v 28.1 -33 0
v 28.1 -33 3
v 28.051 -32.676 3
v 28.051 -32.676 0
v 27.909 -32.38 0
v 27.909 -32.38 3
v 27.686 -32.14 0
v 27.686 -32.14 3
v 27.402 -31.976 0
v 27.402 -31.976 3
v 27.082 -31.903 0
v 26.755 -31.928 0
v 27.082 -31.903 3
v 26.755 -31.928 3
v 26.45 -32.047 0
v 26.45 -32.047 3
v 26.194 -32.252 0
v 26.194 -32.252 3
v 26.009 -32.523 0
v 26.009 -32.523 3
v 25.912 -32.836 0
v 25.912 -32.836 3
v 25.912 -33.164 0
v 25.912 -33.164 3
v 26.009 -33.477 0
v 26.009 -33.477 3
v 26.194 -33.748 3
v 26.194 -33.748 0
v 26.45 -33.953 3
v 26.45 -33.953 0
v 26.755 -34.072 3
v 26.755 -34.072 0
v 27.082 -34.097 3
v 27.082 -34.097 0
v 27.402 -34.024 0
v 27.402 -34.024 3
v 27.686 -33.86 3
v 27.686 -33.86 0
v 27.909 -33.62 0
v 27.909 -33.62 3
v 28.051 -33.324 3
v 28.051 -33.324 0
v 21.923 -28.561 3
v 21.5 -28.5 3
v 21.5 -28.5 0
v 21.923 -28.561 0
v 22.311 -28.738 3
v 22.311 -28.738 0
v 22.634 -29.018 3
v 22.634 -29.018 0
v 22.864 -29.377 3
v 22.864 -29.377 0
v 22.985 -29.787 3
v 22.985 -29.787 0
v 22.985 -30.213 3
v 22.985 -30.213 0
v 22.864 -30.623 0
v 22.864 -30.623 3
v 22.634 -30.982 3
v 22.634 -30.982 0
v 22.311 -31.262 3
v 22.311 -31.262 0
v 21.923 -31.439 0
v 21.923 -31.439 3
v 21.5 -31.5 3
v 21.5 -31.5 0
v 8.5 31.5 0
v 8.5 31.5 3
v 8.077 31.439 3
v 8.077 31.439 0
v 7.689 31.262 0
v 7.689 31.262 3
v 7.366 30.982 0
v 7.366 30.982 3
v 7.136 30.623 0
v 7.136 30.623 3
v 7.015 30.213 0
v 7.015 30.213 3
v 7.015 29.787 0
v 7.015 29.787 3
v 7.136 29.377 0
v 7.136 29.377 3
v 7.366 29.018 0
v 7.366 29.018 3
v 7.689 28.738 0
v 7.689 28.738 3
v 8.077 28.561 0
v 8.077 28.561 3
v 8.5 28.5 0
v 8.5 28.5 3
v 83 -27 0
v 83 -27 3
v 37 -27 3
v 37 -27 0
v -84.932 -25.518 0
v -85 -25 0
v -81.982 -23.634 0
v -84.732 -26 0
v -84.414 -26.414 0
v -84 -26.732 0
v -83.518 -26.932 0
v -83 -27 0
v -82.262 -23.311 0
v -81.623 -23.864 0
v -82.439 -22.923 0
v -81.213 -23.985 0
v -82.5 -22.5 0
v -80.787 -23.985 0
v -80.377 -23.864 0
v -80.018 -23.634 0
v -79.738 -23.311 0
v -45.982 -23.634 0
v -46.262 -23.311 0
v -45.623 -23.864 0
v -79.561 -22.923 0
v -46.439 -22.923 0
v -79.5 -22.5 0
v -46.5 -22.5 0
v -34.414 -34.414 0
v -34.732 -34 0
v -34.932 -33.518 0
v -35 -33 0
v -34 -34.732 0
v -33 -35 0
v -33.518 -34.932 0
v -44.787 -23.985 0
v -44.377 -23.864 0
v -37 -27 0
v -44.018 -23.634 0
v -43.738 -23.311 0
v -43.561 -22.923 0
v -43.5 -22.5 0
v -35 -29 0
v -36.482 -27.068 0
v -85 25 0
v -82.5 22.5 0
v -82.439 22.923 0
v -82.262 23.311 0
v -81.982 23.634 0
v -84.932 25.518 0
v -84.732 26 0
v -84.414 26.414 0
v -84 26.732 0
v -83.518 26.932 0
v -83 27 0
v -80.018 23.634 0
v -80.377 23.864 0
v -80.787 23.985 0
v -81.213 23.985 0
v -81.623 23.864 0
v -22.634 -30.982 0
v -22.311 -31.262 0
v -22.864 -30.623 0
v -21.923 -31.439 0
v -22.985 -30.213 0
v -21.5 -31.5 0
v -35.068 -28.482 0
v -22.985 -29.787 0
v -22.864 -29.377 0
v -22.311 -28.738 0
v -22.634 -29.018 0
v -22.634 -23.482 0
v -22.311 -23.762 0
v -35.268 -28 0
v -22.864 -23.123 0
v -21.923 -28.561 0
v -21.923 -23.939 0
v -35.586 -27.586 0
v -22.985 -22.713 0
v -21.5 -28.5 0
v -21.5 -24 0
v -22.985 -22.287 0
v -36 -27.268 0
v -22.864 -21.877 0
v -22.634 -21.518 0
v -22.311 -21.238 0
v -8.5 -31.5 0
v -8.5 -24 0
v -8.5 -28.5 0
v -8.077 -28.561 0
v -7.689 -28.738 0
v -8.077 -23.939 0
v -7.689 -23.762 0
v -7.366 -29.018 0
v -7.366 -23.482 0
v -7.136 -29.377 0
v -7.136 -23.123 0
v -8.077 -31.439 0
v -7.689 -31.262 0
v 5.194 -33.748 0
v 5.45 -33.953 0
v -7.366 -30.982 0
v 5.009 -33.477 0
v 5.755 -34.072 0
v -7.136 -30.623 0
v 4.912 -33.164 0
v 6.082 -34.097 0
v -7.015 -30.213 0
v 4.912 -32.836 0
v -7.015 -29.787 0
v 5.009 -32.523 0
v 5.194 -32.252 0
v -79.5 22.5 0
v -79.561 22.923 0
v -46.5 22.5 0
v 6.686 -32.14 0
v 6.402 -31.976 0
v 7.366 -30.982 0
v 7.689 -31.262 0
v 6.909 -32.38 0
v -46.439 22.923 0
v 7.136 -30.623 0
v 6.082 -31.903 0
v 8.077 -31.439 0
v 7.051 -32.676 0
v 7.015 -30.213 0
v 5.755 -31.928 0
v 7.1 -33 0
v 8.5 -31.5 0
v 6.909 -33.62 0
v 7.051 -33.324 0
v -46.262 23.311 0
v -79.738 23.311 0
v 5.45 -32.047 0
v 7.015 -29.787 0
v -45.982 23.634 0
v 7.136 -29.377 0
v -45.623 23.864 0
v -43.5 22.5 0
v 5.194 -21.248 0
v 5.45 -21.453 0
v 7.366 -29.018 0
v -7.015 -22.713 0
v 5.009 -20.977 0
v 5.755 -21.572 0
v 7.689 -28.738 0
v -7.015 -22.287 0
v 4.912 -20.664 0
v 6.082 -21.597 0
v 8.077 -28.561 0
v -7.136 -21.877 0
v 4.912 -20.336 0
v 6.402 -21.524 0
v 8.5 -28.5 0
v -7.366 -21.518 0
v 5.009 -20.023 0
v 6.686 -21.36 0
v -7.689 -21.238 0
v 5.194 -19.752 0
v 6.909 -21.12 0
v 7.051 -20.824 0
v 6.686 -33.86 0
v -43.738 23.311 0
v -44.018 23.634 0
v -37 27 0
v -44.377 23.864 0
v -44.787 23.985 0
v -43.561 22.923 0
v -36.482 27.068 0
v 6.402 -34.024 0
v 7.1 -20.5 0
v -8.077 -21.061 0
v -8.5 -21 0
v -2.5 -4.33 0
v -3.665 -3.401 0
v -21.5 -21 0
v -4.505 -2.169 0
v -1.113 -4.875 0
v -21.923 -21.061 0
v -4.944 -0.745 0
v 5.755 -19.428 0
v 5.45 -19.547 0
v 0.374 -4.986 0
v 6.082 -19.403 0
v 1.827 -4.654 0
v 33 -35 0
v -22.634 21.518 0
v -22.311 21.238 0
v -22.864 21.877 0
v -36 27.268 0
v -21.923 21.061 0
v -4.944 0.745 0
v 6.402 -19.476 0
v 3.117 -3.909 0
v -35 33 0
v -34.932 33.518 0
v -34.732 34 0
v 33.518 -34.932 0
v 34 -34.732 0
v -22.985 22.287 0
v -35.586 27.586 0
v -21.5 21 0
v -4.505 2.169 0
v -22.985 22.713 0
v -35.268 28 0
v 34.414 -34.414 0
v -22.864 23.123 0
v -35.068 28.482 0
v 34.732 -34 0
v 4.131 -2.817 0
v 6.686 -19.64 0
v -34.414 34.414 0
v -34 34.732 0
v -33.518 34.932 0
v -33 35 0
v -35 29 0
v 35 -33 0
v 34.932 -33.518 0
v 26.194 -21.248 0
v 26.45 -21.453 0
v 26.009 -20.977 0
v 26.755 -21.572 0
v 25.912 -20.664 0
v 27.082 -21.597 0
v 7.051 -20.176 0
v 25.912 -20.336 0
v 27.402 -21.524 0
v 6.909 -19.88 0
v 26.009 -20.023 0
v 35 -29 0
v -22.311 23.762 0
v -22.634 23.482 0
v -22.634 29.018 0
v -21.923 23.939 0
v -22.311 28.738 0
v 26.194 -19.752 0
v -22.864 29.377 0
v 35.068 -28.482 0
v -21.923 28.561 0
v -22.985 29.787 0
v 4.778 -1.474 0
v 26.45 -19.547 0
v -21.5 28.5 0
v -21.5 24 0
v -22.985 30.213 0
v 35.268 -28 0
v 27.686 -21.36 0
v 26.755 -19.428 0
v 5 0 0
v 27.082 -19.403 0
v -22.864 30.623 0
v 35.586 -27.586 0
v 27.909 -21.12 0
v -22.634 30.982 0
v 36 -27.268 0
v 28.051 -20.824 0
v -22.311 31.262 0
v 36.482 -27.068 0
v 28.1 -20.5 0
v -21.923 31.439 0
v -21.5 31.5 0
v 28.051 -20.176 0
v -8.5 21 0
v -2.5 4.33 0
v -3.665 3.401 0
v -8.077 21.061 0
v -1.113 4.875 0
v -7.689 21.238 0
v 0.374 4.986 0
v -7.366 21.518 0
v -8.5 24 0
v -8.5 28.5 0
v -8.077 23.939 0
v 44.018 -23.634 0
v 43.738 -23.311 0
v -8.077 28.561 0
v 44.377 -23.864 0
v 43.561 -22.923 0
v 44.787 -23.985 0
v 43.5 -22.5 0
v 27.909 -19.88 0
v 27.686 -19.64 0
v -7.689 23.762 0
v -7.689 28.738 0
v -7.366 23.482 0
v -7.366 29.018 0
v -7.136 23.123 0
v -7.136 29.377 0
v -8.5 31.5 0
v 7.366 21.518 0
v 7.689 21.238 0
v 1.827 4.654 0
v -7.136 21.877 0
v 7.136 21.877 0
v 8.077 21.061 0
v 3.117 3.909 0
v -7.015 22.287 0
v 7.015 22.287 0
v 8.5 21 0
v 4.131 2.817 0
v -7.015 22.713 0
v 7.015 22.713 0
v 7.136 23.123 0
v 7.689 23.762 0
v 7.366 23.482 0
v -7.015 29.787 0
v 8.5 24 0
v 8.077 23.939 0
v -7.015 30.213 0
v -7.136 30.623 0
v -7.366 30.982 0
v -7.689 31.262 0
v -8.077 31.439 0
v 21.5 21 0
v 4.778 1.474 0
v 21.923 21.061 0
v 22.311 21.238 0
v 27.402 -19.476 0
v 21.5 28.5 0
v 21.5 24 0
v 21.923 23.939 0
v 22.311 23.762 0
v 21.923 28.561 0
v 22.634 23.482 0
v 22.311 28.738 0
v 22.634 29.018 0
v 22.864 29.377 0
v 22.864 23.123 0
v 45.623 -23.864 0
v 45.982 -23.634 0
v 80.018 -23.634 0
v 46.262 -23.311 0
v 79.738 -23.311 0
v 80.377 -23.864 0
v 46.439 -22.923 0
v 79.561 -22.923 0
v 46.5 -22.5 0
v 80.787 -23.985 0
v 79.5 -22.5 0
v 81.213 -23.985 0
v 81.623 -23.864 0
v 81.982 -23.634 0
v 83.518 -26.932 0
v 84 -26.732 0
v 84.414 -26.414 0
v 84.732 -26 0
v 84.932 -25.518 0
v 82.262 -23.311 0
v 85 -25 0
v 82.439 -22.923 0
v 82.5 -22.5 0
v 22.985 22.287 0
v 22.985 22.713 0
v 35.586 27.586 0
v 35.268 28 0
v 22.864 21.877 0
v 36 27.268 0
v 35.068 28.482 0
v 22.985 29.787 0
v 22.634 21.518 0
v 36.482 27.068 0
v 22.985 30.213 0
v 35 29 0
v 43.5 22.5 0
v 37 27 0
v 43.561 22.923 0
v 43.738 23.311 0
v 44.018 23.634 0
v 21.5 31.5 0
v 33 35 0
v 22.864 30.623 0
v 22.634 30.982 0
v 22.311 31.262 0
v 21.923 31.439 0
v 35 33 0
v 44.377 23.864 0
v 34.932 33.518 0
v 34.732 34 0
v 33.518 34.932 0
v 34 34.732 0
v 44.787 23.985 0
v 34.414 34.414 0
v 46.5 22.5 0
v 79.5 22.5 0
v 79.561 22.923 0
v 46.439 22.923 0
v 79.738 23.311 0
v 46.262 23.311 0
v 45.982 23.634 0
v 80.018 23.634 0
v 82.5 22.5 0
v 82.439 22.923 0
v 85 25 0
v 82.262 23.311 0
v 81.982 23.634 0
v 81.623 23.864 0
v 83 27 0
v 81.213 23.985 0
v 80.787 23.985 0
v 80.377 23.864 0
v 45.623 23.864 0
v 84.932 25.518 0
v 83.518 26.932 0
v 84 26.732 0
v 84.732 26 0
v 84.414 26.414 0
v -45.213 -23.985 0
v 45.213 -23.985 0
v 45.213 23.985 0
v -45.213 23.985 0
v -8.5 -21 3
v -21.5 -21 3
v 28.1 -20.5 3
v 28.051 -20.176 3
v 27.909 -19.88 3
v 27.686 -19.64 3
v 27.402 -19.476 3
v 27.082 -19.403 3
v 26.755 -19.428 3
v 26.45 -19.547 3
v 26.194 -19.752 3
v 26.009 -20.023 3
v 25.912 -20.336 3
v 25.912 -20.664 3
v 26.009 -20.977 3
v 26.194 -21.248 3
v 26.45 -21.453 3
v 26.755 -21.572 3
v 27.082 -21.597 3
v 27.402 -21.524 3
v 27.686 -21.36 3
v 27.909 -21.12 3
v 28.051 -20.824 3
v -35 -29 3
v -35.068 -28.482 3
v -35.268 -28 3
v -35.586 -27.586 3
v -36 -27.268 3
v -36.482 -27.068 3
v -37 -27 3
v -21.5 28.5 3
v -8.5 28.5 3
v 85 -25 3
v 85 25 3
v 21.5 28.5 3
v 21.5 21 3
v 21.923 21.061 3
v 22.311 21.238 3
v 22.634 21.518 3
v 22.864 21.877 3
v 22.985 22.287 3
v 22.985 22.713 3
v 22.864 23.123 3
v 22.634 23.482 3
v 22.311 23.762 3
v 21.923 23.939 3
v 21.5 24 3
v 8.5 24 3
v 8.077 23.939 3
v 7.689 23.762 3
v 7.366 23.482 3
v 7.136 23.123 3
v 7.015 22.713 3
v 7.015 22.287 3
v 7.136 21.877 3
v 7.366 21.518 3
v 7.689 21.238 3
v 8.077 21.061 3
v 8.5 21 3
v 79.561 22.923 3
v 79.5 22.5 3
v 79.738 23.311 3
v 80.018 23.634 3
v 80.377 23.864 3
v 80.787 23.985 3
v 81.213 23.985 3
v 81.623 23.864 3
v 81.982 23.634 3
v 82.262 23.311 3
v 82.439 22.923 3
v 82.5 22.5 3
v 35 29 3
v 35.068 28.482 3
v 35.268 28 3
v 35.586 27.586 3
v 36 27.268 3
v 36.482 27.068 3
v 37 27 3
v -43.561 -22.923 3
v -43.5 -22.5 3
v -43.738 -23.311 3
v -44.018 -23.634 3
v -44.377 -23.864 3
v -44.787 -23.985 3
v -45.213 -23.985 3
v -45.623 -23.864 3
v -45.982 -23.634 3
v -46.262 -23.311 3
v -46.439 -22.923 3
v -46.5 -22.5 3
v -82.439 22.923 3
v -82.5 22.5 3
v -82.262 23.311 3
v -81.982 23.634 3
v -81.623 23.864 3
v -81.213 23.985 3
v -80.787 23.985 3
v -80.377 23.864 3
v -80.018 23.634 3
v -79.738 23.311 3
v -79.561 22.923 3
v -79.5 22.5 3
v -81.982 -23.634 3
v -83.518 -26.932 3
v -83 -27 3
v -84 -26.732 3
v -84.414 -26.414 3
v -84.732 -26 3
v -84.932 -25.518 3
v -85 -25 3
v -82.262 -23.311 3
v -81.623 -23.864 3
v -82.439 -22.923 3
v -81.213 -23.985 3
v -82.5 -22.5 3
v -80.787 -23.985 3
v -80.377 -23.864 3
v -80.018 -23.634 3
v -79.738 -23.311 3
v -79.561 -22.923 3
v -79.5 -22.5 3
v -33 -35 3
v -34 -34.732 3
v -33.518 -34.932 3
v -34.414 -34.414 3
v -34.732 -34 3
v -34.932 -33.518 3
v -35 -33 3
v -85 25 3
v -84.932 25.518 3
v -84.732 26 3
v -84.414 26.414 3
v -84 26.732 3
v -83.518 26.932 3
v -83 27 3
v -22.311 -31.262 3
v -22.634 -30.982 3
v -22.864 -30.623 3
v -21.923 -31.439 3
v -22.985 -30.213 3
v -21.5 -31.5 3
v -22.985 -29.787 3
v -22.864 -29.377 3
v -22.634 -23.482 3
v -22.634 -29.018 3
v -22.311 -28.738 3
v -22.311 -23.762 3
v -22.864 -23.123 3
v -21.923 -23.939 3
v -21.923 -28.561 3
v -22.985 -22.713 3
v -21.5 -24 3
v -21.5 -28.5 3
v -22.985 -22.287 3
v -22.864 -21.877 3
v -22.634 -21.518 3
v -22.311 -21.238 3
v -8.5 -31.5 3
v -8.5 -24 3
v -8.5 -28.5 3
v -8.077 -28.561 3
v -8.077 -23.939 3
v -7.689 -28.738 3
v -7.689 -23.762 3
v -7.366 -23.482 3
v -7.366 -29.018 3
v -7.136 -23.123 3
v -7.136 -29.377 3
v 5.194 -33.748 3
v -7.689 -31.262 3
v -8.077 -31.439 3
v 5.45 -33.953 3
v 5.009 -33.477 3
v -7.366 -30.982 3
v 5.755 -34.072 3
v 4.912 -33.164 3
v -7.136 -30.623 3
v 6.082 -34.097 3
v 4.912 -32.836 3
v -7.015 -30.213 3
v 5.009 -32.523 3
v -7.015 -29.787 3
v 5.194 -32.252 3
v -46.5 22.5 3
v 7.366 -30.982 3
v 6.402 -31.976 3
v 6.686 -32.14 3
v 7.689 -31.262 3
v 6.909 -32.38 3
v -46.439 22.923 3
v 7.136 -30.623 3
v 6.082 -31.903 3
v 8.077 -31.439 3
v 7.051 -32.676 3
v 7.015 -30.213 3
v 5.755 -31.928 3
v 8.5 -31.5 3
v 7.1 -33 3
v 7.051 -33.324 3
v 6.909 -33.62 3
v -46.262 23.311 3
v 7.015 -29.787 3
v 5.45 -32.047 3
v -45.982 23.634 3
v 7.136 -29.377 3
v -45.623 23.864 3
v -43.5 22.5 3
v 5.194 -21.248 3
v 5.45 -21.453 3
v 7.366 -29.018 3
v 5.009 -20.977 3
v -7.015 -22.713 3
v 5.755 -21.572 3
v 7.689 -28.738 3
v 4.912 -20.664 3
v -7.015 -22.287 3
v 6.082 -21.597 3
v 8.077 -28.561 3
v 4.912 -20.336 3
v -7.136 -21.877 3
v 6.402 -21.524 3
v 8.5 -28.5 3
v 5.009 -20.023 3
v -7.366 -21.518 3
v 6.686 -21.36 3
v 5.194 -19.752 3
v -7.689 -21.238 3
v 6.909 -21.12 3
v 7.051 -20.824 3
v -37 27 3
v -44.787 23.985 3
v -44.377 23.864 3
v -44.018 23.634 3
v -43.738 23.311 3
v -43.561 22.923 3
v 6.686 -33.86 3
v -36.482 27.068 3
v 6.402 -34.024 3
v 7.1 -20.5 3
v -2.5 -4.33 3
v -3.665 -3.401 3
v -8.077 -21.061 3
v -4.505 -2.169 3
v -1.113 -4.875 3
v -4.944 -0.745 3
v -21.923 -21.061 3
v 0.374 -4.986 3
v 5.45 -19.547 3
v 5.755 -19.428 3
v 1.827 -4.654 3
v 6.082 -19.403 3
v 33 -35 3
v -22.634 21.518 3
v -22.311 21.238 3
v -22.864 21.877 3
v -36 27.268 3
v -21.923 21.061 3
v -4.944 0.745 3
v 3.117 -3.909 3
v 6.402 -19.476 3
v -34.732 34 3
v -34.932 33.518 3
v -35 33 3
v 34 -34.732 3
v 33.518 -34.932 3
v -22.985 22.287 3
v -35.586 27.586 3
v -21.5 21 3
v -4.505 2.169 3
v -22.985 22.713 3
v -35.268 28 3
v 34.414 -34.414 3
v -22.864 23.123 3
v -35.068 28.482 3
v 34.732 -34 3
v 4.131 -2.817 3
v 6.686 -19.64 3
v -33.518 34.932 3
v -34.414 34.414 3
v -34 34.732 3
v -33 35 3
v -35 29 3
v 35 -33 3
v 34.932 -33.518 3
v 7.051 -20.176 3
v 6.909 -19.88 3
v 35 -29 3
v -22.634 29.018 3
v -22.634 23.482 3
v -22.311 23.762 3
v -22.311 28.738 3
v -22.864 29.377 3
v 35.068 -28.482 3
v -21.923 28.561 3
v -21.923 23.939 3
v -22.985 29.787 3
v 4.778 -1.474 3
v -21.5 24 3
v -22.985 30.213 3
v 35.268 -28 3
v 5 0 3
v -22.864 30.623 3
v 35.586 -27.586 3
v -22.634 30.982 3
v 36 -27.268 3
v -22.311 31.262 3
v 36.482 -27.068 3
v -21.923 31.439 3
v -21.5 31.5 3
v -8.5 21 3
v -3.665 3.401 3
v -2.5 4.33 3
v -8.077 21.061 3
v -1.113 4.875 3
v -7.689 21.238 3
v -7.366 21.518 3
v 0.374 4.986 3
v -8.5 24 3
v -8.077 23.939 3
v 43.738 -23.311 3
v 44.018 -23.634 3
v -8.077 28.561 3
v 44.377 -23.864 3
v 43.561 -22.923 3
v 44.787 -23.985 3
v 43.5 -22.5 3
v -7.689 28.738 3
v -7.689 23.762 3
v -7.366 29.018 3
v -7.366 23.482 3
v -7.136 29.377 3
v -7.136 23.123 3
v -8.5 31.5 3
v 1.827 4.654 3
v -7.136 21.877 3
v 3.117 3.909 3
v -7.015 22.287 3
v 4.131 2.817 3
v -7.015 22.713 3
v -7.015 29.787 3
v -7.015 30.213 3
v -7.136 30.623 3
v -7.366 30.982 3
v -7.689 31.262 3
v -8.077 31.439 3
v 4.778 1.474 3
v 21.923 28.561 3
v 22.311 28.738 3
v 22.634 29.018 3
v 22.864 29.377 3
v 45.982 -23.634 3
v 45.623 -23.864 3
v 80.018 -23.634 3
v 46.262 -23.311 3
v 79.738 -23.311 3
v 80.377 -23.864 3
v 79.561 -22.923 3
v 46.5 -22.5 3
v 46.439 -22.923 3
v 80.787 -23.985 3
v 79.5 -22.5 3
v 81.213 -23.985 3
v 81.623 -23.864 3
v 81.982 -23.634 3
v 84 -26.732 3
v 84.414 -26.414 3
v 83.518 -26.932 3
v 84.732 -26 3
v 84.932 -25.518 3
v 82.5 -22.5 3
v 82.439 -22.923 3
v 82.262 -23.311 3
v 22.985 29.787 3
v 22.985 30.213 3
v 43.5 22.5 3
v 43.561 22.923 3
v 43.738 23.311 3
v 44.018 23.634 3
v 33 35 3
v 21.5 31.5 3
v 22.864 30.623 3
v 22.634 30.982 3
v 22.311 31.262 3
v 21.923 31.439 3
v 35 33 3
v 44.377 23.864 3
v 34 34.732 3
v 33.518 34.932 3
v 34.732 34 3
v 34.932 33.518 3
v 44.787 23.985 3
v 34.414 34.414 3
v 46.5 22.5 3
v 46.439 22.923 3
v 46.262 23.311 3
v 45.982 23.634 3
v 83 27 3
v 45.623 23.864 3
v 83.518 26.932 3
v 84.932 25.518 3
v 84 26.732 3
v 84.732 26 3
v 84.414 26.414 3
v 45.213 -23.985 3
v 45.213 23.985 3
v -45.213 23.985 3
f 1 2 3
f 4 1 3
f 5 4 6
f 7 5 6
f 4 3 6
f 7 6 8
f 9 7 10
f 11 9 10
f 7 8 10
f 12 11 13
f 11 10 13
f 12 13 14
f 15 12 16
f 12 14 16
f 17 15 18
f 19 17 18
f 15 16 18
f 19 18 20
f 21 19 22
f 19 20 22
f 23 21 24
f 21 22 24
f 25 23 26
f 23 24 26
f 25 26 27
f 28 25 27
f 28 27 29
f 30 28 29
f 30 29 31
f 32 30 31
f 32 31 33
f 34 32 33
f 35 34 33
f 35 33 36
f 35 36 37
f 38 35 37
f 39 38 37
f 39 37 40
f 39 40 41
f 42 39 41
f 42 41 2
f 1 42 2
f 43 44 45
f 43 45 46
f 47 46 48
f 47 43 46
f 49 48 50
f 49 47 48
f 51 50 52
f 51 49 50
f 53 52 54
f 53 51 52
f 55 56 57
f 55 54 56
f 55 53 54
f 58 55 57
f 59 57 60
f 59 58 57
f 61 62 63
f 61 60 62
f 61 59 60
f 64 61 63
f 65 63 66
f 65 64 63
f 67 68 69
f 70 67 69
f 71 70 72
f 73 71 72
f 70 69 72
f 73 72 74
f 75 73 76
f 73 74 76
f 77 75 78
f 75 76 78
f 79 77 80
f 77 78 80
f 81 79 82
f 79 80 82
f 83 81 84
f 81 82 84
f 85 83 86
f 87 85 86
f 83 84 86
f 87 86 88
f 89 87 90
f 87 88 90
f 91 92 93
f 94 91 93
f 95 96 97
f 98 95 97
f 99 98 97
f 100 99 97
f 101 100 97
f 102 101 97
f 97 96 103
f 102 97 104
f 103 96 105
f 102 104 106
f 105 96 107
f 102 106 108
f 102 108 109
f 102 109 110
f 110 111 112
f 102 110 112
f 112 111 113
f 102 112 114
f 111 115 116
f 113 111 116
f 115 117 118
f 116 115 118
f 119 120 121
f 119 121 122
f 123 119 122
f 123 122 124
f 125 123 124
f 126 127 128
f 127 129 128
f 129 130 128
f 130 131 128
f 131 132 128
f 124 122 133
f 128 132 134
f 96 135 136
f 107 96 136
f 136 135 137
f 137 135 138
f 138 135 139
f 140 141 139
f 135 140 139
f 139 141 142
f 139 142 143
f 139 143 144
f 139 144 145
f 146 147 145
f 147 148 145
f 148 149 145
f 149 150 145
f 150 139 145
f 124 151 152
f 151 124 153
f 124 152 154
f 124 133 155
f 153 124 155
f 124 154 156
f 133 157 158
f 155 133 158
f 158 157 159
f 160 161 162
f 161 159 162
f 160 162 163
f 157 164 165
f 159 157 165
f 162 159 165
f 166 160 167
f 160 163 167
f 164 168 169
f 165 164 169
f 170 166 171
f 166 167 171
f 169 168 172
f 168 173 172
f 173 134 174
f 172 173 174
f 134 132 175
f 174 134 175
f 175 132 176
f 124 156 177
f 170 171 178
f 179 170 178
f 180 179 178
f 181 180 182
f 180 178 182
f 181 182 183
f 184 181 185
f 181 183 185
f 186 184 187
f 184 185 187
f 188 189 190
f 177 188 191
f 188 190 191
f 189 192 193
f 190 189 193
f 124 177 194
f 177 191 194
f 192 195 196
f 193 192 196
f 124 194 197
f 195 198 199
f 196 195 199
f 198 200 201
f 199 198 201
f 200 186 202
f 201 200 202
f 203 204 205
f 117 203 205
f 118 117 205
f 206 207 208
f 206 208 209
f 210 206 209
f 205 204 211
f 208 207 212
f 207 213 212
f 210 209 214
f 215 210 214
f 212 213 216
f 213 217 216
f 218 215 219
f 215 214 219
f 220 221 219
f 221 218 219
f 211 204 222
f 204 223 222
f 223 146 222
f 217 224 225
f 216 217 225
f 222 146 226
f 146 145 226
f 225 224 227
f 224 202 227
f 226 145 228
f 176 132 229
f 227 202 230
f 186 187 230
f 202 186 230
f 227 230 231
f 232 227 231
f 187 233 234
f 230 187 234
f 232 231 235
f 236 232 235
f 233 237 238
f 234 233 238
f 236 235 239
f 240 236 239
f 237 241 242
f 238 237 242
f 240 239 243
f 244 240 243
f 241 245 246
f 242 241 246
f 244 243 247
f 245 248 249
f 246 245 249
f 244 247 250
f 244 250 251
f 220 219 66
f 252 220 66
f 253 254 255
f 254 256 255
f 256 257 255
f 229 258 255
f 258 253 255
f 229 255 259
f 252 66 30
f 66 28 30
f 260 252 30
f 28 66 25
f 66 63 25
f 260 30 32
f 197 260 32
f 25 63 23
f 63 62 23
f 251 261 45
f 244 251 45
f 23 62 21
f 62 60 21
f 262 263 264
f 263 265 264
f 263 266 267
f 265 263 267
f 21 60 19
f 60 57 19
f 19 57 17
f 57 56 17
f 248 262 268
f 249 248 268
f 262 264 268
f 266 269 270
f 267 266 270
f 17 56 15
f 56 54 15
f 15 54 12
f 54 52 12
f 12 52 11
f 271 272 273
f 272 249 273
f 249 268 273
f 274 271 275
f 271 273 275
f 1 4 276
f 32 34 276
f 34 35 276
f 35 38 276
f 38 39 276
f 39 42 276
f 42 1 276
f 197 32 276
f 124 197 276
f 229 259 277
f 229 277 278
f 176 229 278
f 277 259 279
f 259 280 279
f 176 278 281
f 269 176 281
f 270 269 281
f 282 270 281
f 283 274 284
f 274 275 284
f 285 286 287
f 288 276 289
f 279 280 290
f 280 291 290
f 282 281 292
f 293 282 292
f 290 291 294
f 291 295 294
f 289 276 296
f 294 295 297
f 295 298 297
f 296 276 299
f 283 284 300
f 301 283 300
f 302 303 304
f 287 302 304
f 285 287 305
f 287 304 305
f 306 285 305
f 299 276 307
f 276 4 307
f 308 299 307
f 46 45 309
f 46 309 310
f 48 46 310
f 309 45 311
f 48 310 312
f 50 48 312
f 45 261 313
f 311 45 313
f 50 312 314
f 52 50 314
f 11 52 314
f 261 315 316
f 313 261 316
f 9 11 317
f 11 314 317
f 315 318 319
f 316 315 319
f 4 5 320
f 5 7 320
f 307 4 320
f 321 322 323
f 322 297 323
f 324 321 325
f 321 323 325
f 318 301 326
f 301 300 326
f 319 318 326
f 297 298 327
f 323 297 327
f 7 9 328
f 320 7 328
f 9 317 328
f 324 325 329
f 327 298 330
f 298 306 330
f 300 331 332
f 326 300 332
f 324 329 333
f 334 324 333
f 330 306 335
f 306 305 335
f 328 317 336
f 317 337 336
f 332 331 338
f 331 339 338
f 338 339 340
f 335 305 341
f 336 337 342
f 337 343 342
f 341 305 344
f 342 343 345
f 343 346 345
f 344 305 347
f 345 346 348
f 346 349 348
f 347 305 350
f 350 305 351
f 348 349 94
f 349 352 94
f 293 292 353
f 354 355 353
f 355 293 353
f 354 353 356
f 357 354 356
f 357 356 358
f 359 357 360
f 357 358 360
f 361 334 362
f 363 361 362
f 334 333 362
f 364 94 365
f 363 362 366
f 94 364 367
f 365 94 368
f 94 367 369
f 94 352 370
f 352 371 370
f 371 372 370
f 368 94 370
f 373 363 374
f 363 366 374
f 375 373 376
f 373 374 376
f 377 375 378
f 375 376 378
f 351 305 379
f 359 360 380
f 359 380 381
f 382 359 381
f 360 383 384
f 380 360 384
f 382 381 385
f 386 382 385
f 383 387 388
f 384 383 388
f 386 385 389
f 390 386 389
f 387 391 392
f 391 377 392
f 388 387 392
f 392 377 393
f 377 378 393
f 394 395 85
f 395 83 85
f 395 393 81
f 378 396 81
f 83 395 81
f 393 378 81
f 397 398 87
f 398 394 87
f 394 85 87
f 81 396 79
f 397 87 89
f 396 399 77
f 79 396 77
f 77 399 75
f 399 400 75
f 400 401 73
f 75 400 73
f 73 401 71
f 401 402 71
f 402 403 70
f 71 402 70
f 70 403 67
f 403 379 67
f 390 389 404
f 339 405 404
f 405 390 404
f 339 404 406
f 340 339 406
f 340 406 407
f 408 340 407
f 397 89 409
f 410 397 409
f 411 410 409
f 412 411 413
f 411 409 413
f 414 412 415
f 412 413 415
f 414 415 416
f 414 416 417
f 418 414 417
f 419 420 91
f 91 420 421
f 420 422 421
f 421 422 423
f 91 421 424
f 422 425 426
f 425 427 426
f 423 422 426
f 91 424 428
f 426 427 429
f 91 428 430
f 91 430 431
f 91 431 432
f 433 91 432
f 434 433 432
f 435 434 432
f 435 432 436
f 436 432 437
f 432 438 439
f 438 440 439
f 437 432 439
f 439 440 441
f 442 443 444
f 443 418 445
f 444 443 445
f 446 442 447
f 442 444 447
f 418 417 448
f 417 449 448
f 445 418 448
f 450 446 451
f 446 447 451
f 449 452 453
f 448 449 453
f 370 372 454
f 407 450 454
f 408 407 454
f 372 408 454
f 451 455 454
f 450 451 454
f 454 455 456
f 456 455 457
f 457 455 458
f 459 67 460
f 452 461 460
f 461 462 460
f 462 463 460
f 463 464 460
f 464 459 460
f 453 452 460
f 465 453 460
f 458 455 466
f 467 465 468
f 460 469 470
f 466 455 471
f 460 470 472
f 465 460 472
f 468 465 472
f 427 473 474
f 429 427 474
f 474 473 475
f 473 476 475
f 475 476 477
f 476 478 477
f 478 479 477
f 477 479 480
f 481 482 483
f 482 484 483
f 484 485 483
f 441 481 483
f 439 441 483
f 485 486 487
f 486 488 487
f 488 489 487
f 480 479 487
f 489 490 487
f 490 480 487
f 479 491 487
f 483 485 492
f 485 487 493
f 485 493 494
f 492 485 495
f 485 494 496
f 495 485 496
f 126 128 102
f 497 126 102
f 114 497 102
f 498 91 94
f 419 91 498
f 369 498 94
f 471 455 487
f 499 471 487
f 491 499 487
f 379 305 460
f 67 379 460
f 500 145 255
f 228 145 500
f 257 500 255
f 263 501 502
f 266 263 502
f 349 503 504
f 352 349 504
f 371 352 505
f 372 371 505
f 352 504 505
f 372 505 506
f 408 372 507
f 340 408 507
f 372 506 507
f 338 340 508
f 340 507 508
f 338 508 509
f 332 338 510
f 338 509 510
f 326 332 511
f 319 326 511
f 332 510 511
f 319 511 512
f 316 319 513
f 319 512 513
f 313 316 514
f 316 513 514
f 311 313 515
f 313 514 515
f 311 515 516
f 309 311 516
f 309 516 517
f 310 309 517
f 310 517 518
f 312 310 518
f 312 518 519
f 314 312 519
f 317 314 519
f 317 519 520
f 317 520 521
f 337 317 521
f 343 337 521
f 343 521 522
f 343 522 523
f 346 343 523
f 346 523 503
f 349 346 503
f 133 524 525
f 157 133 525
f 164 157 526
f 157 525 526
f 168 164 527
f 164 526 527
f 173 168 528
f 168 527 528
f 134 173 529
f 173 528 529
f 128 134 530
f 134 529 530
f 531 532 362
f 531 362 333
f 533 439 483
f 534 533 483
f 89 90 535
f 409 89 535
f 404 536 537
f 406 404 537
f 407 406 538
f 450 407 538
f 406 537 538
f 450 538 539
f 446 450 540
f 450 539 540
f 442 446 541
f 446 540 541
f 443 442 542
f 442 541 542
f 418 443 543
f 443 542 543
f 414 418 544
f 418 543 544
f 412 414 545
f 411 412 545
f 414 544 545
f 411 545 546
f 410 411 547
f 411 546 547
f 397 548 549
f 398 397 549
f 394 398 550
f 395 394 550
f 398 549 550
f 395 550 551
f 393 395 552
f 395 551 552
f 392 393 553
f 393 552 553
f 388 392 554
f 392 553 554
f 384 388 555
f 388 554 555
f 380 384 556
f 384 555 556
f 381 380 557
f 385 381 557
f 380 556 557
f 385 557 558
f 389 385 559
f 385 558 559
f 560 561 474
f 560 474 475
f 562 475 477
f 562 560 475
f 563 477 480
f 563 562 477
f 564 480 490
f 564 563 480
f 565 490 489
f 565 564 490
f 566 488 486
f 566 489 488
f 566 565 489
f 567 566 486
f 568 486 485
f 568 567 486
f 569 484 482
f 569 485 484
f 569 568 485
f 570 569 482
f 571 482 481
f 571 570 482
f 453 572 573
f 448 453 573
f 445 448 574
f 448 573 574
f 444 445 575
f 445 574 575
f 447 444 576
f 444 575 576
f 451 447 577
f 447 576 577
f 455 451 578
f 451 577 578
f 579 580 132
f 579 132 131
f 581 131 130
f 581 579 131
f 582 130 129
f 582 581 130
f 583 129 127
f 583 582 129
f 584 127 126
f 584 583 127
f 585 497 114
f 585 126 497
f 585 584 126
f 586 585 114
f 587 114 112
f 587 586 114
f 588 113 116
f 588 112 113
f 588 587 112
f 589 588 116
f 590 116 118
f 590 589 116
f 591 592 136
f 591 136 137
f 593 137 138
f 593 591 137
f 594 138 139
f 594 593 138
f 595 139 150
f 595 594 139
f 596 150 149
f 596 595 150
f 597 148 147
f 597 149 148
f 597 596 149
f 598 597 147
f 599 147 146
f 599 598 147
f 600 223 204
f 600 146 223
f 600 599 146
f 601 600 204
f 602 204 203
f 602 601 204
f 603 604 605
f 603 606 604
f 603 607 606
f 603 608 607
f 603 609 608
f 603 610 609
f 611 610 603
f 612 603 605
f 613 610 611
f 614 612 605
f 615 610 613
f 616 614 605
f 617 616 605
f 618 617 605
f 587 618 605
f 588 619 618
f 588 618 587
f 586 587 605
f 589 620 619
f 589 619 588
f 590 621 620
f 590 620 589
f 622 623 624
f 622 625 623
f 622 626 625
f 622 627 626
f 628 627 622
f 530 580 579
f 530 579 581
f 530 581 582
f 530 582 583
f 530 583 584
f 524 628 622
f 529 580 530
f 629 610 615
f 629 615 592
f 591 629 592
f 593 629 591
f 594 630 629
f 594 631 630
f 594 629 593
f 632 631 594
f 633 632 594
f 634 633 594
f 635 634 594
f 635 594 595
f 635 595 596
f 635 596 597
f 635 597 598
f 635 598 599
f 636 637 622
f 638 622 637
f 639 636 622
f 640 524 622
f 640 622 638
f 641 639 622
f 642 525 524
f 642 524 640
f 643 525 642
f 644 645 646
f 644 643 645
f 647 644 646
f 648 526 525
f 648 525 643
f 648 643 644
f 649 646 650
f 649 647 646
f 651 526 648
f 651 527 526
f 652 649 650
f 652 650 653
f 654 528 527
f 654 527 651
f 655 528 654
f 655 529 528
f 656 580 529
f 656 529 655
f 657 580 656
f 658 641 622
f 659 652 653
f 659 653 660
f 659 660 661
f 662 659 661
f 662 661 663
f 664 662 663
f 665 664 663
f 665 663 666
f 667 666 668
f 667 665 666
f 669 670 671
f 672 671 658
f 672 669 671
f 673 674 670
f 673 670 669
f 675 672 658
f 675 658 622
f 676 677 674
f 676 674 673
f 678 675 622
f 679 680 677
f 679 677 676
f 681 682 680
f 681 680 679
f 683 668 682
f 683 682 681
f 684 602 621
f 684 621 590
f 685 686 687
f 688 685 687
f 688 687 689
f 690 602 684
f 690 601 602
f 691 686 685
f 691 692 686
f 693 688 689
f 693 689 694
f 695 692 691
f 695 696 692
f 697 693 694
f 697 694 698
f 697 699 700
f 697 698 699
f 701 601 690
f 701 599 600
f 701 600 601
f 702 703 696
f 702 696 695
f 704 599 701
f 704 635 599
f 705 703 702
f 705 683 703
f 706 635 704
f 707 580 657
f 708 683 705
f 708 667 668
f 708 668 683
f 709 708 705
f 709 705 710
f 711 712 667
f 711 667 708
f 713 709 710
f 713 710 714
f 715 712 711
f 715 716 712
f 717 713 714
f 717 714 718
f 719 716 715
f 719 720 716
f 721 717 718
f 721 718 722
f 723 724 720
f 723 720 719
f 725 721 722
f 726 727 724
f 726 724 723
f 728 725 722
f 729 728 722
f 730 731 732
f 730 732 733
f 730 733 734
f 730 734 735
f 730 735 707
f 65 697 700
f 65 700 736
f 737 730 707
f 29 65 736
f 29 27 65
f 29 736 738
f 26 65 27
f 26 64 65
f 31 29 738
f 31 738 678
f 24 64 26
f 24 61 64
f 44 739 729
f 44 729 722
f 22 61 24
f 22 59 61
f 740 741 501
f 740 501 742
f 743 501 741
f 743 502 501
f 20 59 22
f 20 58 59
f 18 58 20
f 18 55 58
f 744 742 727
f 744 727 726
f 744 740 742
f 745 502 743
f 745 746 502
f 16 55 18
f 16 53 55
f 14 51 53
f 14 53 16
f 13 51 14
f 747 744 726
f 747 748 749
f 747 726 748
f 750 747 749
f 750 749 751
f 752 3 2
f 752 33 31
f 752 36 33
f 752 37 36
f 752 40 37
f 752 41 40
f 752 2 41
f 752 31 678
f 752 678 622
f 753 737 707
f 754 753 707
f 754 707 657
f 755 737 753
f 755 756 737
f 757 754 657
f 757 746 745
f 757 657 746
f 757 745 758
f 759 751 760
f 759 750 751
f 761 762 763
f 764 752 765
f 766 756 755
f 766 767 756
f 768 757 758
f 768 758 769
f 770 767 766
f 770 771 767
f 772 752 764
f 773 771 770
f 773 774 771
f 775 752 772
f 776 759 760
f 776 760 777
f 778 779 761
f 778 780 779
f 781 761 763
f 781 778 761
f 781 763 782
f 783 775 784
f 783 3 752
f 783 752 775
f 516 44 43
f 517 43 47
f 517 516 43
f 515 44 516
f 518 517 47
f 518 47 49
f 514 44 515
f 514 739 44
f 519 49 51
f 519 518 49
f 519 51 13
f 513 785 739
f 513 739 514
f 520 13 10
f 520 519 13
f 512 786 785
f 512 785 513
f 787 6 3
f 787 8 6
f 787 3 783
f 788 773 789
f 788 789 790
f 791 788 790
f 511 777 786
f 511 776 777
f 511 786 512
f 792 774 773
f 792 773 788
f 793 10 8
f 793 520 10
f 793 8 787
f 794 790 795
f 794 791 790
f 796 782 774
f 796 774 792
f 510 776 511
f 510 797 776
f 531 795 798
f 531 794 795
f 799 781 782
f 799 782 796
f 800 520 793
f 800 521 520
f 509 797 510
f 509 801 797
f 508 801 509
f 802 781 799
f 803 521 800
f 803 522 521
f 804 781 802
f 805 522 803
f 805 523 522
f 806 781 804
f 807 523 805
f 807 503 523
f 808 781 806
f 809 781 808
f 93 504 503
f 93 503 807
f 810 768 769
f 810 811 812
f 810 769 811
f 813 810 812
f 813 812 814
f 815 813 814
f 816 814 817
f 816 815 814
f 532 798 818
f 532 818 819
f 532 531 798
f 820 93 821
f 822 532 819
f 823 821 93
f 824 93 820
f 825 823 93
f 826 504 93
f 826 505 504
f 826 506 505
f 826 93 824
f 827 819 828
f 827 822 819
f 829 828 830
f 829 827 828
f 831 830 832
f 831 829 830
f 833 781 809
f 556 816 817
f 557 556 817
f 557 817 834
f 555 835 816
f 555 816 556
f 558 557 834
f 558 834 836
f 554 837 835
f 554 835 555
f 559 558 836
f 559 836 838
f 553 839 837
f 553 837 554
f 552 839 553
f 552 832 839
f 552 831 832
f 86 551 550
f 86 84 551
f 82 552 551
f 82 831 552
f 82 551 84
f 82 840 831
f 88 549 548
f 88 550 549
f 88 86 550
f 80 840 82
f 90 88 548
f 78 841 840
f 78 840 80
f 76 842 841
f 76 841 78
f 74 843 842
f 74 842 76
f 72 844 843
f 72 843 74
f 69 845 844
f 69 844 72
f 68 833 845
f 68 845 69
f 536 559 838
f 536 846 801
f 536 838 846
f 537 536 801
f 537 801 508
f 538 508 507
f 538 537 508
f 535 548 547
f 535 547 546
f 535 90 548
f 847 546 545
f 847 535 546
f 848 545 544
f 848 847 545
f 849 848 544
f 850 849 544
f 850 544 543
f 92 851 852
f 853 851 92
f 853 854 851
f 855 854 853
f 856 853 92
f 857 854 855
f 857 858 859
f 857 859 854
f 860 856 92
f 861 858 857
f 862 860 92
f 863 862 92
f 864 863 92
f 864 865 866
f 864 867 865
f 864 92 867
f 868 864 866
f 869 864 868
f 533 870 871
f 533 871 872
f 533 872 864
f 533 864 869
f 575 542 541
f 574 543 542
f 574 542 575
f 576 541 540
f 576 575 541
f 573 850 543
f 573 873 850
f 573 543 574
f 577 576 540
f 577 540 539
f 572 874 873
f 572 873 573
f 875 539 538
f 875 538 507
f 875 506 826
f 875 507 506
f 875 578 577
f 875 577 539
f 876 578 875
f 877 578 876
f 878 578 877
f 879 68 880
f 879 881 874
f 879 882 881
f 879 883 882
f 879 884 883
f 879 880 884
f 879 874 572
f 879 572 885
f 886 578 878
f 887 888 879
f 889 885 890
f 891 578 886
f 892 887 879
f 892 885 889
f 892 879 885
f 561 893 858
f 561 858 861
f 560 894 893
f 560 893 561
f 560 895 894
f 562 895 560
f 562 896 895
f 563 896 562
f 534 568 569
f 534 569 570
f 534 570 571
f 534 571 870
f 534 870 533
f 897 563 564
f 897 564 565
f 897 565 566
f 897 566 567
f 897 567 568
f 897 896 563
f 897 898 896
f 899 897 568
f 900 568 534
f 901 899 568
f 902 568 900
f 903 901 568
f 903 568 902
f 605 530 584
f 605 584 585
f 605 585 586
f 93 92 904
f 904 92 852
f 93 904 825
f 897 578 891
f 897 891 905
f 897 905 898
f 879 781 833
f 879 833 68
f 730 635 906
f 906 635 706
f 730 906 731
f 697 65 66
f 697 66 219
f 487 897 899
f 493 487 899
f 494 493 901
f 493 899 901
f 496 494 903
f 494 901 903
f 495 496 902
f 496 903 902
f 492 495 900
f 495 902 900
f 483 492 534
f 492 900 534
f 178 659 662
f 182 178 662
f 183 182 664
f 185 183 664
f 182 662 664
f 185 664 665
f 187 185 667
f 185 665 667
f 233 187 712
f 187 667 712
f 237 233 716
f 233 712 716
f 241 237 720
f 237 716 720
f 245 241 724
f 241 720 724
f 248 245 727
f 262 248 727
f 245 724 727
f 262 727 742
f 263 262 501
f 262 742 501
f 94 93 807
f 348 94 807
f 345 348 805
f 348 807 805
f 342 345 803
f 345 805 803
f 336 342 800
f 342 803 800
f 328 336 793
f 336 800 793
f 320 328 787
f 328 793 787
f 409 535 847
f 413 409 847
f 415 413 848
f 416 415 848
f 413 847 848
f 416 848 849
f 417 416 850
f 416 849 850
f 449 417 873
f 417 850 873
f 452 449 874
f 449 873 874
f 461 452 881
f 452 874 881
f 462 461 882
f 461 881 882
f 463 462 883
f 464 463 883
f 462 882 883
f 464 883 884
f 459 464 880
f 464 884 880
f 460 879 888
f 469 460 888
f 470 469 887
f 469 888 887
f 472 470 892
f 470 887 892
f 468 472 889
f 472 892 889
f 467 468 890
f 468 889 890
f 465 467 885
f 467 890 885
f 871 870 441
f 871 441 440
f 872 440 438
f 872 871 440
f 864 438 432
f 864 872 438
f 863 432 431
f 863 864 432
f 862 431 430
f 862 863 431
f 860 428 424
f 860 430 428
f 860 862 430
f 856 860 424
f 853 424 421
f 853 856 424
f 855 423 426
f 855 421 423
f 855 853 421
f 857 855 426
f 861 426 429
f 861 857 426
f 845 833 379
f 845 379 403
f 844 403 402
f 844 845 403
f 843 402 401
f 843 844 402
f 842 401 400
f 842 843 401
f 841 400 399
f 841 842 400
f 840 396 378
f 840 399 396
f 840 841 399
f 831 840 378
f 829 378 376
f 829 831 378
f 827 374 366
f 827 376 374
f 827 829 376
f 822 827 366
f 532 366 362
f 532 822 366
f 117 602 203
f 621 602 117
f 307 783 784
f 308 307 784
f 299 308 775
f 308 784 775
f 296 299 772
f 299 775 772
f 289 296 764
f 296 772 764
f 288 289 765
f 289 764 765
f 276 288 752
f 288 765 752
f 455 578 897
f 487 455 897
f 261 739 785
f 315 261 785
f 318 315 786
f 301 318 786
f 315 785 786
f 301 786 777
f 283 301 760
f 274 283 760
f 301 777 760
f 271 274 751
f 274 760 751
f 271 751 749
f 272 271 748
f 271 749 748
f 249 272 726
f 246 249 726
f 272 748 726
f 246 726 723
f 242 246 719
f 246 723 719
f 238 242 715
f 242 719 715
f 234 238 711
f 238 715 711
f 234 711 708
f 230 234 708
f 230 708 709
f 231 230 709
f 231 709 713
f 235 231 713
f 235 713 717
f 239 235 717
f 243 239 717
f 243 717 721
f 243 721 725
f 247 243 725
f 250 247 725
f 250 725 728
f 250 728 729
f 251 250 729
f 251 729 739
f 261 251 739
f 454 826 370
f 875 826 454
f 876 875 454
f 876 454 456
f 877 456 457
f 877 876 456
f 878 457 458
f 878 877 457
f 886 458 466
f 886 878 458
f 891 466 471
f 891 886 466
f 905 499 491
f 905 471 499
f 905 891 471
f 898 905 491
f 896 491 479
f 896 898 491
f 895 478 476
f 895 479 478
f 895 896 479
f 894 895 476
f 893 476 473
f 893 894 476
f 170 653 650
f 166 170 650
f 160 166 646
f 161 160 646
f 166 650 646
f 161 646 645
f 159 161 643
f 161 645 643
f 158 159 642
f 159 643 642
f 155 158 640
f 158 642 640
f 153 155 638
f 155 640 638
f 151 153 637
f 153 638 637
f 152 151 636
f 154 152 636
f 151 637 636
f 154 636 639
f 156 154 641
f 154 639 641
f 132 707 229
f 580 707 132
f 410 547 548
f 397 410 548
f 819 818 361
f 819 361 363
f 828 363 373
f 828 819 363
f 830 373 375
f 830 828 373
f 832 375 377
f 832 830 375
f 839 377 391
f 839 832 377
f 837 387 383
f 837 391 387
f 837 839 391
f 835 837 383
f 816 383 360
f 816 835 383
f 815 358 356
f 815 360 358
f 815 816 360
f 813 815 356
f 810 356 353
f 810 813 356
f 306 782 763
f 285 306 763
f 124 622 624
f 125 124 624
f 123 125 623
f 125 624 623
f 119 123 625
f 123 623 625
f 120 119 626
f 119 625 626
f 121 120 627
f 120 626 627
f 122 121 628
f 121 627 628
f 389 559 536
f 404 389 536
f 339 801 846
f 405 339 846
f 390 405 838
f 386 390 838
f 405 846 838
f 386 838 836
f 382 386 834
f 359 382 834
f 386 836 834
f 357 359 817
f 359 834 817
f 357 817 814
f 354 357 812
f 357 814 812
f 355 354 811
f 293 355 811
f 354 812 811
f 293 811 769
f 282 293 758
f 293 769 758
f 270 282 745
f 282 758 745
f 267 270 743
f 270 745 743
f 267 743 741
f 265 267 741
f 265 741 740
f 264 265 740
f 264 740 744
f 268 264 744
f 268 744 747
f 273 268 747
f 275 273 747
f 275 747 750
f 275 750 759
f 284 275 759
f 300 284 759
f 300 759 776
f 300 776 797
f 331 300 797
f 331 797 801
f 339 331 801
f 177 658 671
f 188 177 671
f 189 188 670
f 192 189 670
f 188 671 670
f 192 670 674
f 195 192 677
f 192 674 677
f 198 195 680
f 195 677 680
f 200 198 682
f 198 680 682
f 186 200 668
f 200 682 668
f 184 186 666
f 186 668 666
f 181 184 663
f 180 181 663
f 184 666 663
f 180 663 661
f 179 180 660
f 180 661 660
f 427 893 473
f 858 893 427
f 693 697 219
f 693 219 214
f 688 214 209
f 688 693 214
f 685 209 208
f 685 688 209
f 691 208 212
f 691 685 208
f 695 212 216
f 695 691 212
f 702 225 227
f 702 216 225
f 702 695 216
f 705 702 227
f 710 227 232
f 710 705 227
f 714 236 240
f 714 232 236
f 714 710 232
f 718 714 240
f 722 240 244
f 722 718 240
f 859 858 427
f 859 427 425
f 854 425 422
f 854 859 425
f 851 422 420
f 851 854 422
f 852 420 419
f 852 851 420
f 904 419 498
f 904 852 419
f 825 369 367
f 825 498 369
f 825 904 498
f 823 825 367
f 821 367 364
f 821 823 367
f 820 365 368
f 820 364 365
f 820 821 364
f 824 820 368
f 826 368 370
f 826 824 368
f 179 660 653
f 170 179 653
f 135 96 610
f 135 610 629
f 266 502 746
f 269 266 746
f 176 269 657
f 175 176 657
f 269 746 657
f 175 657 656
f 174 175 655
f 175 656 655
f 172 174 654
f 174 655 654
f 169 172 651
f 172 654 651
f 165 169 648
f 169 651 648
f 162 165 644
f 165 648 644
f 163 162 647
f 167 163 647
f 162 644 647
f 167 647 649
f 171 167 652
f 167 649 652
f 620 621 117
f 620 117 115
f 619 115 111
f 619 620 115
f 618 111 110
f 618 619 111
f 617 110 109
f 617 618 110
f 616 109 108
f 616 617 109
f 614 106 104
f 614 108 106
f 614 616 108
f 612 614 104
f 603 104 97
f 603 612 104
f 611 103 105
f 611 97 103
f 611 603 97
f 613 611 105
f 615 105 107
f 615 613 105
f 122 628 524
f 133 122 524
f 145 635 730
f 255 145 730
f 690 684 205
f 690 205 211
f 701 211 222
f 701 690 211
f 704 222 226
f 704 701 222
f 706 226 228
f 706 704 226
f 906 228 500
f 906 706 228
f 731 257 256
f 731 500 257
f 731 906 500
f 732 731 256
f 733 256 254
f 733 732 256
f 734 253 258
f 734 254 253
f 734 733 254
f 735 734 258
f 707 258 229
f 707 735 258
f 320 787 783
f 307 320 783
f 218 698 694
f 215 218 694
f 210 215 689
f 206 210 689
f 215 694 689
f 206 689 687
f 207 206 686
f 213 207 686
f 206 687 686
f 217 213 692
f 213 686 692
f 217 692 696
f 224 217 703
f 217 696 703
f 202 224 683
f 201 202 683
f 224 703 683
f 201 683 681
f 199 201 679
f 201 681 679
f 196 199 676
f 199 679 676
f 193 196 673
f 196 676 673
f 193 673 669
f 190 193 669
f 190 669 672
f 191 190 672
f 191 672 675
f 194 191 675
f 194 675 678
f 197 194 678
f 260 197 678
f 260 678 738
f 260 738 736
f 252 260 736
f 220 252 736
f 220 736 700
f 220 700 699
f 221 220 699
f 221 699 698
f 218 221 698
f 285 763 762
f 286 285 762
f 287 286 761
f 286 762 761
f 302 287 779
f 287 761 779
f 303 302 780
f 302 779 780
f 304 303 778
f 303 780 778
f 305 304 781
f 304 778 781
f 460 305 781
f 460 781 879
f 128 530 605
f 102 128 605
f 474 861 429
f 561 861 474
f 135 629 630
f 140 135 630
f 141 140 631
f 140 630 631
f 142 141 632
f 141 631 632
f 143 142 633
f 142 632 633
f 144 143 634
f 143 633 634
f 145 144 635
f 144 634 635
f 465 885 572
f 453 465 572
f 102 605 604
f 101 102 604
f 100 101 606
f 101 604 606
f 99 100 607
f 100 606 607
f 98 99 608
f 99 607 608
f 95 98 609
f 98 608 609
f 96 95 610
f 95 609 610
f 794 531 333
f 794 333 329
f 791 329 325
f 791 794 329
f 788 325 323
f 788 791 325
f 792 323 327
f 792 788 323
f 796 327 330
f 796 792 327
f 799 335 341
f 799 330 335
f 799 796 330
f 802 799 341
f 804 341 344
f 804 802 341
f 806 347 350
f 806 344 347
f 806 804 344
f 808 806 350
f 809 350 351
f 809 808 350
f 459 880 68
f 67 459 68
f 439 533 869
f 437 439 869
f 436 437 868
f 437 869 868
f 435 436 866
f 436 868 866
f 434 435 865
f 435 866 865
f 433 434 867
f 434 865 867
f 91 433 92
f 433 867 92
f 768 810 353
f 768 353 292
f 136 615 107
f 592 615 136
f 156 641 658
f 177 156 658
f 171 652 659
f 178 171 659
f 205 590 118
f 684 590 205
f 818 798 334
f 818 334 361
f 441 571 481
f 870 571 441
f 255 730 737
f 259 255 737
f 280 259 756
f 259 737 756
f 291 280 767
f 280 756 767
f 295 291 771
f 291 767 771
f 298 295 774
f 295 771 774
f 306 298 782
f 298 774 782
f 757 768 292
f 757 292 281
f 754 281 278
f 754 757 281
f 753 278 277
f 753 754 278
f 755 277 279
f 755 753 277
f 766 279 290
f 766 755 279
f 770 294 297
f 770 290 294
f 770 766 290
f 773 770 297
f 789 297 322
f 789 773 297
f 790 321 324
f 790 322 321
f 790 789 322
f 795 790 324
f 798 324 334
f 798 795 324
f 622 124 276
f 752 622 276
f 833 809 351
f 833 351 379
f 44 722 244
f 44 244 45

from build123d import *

# Parameters (mm, degrees)
SKETCH_1_W          = 170
SKETCH_1_H          = 70
EXTRUDE_1_DEPTH     = 3
SKETCH_2_R          = 5
SKETCH_2_R_2        = 1.1
CUT_EXTRUDE_1_DEPTH = 92.972822073
CUT_EXTRUDE_2_DEPTH = 92.972822073


with BuildPart() as part:
    # 草圖1 → 填料-伸長1 (new body)
    with BuildSketch(Plane.XY):
        Rectangle(SKETCH_1_W, SKETCH_1_H)
    extrude(amount=EXTRUDE_1_DEPTH)

    # 草圖2 → 除料-伸長1 (cut, through all)
    with BuildSketch(Plane.XY.offset(3)):
        Circle(SKETCH_2_R)
        with Locations((27, -20.5)):
            Circle(SKETCH_2_R_2)
        with Locations((6, -20.5)):
            Circle(SKETCH_2_R_2)
        with Locations((6, -33)):
            Circle(SKETCH_2_R_2)
        with Locations((27, -33)):
            Circle(SKETCH_2_R_2)
        with BuildLine():
            Line((43.5, -22.5), (43.5, 22.5))
            ThreePointArc((43.5, 22.5), (45, 24), (46.5, 22.5))
            Line((46.5, 22.5), (46.5, -22.5))
            ThreePointArc((46.5, -22.5), (45, -24), (43.5, -22.5))
        make_face()
        with BuildLine():
            Line((-46.5, -22.5), (-46.5, 22.5))
            ThreePointArc((-46.5, 22.5), (-45, 24), (-43.5, 22.5))
            Line((-43.5, 22.5), (-43.5, -22.5))
            ThreePointArc((-43.5, -22.5), (-45, -24), (-46.5, -22.5))
        make_face()
        with BuildLine():
            Line((-82.5, -22.5), (-82.5, 22.5))
            ThreePointArc((-82.5, 22.5), (-81, 24), (-79.5, 22.5))
            Line((-79.5, 22.5), (-79.5, -22.5))
            ThreePointArc((-79.5, -22.5), (-81, -24), (-82.5, -22.5))
        make_face()
        with BuildLine():
            Line((79.5, -22.5), (79.5, 22.5))
            ThreePointArc((79.5, 22.5), (81, 24), (82.5, 22.5))
            Line((82.5, 22.5), (82.5, -22.5))
            ThreePointArc((82.5, -22.5), (81, -24), (79.5, -22.5))
        make_face()
        with BuildLine():
            Line((21.5, -31.5), (8.5, -31.5))
            ThreePointArc((8.5, -31.5), (7, -30), (8.5, -28.5))
            Line((8.5, -28.5), (21.5, -28.5))
            ThreePointArc((21.5, -28.5), (23, -30), (21.5, -31.5))
        make_face()
        with BuildLine():
            Line((-21.5, -31.5), (-8.5, -31.5))
            ThreePointArc((-8.5, -31.5), (-7, -30), (-8.5, -28.5))
            Line((-8.5, -28.5), (-21.5, -28.5))
            ThreePointArc((-21.5, -28.5), (-23, -30), (-21.5, -31.5))
        make_face()
        with BuildLine():
            Line((21.5, 31.5), (8.5, 31.5))
            ThreePointArc((8.5, 31.5), (7, 30), (8.5, 28.5))
            Line((8.5, 28.5), (21.5, 28.5))
            ThreePointArc((21.5, 28.5), (23, 30), (21.5, 31.5))
        make_face()
        with BuildLine():
            Line((-21.5, 31.5), (-8.5, 31.5))
            ThreePointArc((-8.5, 31.5), (-7, 30), (-8.5, 28.5))
            Line((-8.5, 28.5), (-21.5, 28.5))
            ThreePointArc((-21.5, 28.5), (-23, 30), (-21.5, 31.5))
        make_face()
        with BuildLine():
            Line((21.5, 24), (8.5, 24))
            ThreePointArc((8.5, 24), (7, 22.5), (8.5, 21))
            Line((8.5, 21), (21.5, 21))
            ThreePointArc((21.5, 21), (23, 22.5), (21.5, 24))
        make_face()
        with BuildLine():
            Line((-21.5, 24), (-8.5, 24))
            ThreePointArc((-8.5, 24), (-7, 22.5), (-8.5, 21))
            Line((-8.5, 21), (-21.5, 21))
            ThreePointArc((-21.5, 21), (-23, 22.5), (-21.5, 24))
        make_face()
        with BuildLine():
            Line((-21.5, -24), (-8.5, -24))
            ThreePointArc((-8.5, -24), (-7, -22.5), (-8.5, -21))
            Line((-8.5, -21), (-21.5, -21))
            ThreePointArc((-21.5, -21), (-23, -22.5), (-21.5, -24))
        make_face()
    extrude(amount=-CUT_EXTRUDE_1_DEPTH, mode=Mode.SUBTRACT)

    # 草圖4 → 除料-伸長2 (cut, through all)
    with BuildSketch(Plane.XY.offset(3)):
        with BuildLine():
            Line((85, 35), (35, 35))
            Line((35, 35), (33, 35))
            ThreePointArc((33, 35), (34.414213562, 34.414213562), (35, 33))
            Line((35, 33), (35, 29))
            ThreePointArc((35, 29), (35.585786438, 27.585786438), (37, 27))
            Line((37, 27), (83, 27))
            ThreePointArc((83, 27), (84.414213562, 26.414213562), (85, 25))
            Line((85, 25), (85, 27))
            Line((85, 27), (85, 35))
        make_face()
        with BuildLine():
            Line((85, -27), (85, -25))
            ThreePointArc((85, -25), (84.414213562, -26.414213562), (83, -27))
            Line((83, -27), (37, -27))
            ThreePointArc((37, -27), (35.585786438, -27.585786438), (35, -29))
            Line((35, -29), (35, -33))
            ThreePointArc((35, -33), (34.414213562, -34.414213562), (33, -35))
            Line((33, -35), (35, -35))
            Line((35, -35), (85, -35))
            Line((85, -35), (85, -27))
        make_face()
        with BuildLine():
            Line((-85, -35), (-35, -35))
            Line((-35, -35), (-33, -35))
            ThreePointArc((-33, -35), (-34.414213562, -34.414213562), (-35, -33))
            Line((-35, -33), (-35, -29))
            ThreePointArc((-35, -29), (-35.585786438, -27.585786438), (-37, -27))
            Line((-37, -27), (-83, -27))
            ThreePointArc((-83, -27), (-84.414213562, -26.414213562), (-85, -25))
            Line((-85, -25), (-85, -27))
            Line((-85, -27), (-85, -35))
        make_face()
        with BuildLine():
            Line((-85, 27), (-85, 25))
            ThreePointArc((-85, 25), (-84.414213562, 26.414213562), (-83, 27))
            Line((-83, 27), (-37, 27))
            ThreePointArc((-37, 27), (-35.585786438, 27.585786438), (-35, 29))
            Line((-35, 29), (-35, 33))
            ThreePointArc((-35, 33), (-34.414213562, 34.414213562), (-33, 35))
            Line((-33, 35), (-35, 35))
            Line((-35, 35), (-85, 35))
            Line((-85, 35), (-85, 27))
        make_face()
    extrude(amount=-CUT_EXTRUDE_2_DEPTH, mode=Mode.SUBTRACT)


solid = part.part
